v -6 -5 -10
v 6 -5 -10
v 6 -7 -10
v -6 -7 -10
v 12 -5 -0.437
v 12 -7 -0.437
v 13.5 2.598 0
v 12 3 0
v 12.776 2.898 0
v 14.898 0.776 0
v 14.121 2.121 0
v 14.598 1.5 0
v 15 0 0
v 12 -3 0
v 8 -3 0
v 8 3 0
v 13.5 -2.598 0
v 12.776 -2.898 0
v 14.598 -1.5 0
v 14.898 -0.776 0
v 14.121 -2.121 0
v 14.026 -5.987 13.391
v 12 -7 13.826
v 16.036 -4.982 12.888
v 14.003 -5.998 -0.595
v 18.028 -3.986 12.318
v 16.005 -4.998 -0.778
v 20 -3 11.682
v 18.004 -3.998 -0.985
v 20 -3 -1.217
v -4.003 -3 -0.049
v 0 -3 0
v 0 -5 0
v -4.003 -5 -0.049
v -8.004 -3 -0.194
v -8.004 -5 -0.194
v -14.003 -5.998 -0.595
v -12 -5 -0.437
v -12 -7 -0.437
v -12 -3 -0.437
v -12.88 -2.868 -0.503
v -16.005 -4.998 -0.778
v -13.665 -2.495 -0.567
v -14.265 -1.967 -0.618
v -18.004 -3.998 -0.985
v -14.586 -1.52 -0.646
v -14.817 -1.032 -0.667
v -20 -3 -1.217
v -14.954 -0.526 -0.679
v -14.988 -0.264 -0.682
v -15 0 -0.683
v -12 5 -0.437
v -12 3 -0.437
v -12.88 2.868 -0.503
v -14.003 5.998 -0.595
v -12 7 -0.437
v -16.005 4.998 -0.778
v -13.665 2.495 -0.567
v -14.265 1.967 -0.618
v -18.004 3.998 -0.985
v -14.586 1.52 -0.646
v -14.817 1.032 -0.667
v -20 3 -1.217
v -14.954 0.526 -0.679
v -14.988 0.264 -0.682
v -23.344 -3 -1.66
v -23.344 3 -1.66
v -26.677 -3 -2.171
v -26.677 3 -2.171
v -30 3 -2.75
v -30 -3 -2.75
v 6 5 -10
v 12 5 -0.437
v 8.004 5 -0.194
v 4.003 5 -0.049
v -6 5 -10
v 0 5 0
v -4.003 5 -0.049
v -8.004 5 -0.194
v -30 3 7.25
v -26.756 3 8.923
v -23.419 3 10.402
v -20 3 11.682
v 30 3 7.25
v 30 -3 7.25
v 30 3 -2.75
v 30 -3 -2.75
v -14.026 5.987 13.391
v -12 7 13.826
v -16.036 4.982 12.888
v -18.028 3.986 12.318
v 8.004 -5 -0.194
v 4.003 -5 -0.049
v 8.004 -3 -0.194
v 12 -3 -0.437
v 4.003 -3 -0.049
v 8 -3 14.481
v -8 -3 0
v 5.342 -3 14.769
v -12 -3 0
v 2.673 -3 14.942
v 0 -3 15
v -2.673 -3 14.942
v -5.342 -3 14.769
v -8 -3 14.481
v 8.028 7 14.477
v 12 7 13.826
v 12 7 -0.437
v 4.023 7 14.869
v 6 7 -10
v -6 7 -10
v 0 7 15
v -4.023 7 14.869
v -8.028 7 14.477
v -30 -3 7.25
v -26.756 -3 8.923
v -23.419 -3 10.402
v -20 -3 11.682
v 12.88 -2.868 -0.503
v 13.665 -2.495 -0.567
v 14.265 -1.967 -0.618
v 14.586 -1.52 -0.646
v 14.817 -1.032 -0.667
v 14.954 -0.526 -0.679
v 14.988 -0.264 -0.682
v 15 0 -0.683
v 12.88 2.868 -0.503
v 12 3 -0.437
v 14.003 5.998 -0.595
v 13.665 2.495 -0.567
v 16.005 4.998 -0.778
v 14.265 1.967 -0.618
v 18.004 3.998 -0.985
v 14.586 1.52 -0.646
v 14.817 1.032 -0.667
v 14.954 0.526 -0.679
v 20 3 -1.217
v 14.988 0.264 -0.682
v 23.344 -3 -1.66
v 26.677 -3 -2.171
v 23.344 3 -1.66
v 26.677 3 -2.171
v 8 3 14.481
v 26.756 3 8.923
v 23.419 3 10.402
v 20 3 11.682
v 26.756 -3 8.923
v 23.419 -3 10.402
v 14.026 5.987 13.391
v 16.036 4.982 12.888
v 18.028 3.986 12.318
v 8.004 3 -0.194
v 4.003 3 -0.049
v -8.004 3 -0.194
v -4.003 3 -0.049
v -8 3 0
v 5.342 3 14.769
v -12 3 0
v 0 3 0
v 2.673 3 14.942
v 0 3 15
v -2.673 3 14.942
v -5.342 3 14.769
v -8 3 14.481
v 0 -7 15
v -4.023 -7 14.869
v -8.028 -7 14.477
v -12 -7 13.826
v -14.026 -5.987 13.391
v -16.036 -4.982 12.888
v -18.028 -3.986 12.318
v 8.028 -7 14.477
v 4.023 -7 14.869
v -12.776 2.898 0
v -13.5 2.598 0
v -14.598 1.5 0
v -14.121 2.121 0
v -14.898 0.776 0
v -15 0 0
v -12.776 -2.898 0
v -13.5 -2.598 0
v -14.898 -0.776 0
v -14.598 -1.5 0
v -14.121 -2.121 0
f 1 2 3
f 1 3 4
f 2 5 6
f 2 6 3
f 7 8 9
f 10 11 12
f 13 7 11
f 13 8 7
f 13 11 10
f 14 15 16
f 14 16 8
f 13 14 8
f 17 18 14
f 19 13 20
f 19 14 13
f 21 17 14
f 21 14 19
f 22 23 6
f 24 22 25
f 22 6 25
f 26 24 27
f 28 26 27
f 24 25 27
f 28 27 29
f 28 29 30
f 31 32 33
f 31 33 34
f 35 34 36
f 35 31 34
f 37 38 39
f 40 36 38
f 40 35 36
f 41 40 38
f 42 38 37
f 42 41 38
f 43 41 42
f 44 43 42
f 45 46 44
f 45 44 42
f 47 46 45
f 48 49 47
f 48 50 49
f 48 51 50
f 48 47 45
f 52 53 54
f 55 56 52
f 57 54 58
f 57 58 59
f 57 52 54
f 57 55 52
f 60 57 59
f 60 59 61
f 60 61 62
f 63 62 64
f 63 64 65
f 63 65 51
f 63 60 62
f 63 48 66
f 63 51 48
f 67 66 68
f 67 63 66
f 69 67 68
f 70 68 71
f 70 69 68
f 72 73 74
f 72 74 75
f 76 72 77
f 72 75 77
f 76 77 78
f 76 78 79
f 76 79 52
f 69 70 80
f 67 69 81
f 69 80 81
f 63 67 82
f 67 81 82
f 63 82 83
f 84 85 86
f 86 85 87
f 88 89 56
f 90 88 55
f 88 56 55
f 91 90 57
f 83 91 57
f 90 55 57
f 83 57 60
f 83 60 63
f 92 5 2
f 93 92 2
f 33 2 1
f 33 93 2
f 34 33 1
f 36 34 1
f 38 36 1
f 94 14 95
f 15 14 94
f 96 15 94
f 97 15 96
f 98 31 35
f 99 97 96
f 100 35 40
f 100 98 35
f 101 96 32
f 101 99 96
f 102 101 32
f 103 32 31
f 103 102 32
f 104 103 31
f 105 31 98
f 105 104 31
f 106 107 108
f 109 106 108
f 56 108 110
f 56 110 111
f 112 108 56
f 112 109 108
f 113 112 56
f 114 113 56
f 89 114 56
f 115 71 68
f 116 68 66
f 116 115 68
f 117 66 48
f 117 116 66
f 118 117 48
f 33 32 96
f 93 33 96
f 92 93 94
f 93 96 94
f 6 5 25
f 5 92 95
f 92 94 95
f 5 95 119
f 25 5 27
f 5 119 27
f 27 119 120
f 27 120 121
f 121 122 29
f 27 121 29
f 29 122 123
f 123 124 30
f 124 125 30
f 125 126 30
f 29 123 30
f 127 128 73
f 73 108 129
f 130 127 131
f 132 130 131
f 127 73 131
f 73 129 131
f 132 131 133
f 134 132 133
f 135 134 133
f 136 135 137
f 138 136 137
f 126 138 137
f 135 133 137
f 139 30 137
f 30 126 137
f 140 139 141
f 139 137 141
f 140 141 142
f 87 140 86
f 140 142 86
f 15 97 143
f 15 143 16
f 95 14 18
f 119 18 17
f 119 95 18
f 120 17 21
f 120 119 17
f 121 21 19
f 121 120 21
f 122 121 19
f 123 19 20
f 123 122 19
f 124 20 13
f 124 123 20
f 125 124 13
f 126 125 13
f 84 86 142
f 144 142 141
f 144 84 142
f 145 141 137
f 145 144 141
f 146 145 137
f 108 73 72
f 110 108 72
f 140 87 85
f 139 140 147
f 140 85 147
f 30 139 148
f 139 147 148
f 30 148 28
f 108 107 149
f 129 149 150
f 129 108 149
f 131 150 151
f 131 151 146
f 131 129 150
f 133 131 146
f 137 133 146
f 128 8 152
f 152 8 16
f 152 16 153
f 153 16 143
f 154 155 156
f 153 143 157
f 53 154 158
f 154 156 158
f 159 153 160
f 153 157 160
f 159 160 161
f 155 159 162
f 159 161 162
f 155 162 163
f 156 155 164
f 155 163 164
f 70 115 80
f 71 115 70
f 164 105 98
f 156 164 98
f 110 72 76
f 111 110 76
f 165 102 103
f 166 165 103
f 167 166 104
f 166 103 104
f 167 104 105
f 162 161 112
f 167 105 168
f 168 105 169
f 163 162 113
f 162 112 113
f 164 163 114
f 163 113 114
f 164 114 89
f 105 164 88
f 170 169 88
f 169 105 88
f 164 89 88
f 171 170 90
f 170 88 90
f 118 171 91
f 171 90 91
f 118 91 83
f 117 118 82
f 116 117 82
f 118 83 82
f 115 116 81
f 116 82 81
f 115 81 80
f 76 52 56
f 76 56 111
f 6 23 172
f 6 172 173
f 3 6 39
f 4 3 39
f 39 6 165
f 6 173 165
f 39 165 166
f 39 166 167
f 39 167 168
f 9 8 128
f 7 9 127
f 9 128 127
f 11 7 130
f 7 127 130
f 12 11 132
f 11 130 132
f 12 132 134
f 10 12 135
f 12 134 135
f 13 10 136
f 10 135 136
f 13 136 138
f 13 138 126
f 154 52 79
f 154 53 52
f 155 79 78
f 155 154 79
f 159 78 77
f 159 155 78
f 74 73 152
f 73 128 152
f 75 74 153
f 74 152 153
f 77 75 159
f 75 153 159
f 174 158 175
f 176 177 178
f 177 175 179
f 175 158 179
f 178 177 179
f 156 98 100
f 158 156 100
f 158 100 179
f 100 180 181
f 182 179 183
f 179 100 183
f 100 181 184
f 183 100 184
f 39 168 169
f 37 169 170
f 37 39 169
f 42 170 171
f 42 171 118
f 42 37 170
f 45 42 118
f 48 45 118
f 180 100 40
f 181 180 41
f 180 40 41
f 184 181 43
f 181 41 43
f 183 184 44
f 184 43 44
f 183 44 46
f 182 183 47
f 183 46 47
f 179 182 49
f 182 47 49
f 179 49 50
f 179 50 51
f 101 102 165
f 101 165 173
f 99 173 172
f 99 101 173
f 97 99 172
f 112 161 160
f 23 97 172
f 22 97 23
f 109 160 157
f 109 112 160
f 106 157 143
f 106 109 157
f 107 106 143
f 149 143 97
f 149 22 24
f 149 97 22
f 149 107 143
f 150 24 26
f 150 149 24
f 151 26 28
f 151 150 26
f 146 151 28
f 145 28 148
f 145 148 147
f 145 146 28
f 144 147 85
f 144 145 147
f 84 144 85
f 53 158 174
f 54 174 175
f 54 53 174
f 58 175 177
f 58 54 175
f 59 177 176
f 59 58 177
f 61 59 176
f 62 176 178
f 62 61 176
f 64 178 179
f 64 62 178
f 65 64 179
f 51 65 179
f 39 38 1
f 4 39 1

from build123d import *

# Parameters (mm, degrees)
F2_DEPTH    = 3
F3_DEPTH    = 5
F4_START    = 5
F4_DEPTH    = 2
F5_T4_DEPTH = 55.7006365314
F5_S5_R     = 165
F5_T6_DEPTH = 30
F5_S7_R     = 61.9381694392
F5_T8_DEPTH = 30
F6_DEPTH    = 3
F7_R        = 2.99999


# Not quite as in the source:
# - a fillet or chamfer that OpenCascade refuses, or shapes differently, is made with other operations: its cross-section is extruded or revolved along the edge and cut away or added
# - a fillet or chamfer is up to 0.001 mm smaller than in the source, because OpenCascade refuses the exact size
# - a feature names something its author has since deleted; it is built from what else it names


with BuildPart() as f2:
    # F1 (on Front) → F2 (new body)
    with BuildSketch(Plane.XZ):
        with BuildLine():
            ThreePointArc((-30, -2.7501926041), (-21.0318278303, -1.3459068092), (-12, -0.4369421772))
            Line((-12, -0.4369421772), (-12, 13.8264323737))
            ThreePointArc((-12, 13.8264323737), (-21.2558932775, 11.2384911254), (-30, 7.2498073959))
            Line((-30, 7.2498073959), (-30, -2.7501926041))
        make_face()
        with BuildLine():
            ThreePointArc((-12, -0.4369421772), (-6.0039761506, -0.1092717271), (0, 0))
            Line((0, 0), (0, 15))
            ThreePointArc((0, 15), (-6.028624656, 14.7059099053), (-12, 13.8264323737))
            Line((-12, 13.8264323737), (-12, -0.4369421772))
        make_face()
    extrude(amount=F2_DEPTH)

    # F1 (on Front) → F3 (join)
    with BuildSketch(Plane.XZ):
        with BuildLine():
            ThreePointArc((-12, -0.4369421772), (-6.0039761506, -0.1092717271), (0, 0))
            Line((0, 0), (0, 15))
            ThreePointArc((0, 15), (-6.028624656, 14.7059099053), (-12, 13.8264323737))
            Line((-12, 13.8264323737), (-12, -0.4369421772))
        make_face()
    extrude(amount=F3_DEPTH)

    # F1 (on Front) → F4 (join)
    with BuildSketch(Plane.XZ.offset(F4_START)):
        with BuildLine():
            Line((0, -10), (0, 0))
            ThreePointArc((0, 0), (-6.0039761506, -0.1092717271), (-12, -0.4369421772))
            Line((-12, -0.4369421772), (-6, -10))
            Line((-6, -10), (0, -10))
        make_face()
        with BuildLine():
            ThreePointArc((-12, -0.4369421772), (-6.0039761506, -0.1092717271), (0, 0))
            Line((0, 0), (0, 15))
            ThreePointArc((0, 15), (-6.028624656, 14.7059099053), (-12, 13.8264323737))
            Line((-12, 13.8264323737), (-12, -0.4369421772))
        make_face()
    extrude(amount=F4_DEPTH)

    # F5: chamfer of 4 x 8 on 1 edges, made by hand


with BuildPart() as f5_tool2:
    # F5_s3 → F5_t4 (new body)
    with BuildSketch(Plane.XY.offset(-21.1555731675)):
        with BuildLine():
            Line((-11.7137832989, -7.1431083506), (-20.2862167011, -2.8568916494))
            Line((-20.2862167011, -2.8568916494), (-20.2862167011, -2.6968916494))
            ThreePointArc((-20.2862167011, -2.6968916494), (-16.1431083506, -2.84), (-12, -2.84))
            Line((-12, -2.84), (-11.84, -3))
            ThreePointArc((-11.84, -3), (-11.84, -5.0715541753), (-11.5537832989, -7.1431083506))
            Line((-11.5537832989, -7.1431083506), (-11.7137832989, -7.1431083506))
        make_face()
    extrude(amount=F5_T4_DEPTH)

    # F5_s5 → F5_t6 (cut, symmetric)
    with BuildSketch(Plane.XZ.offset(4.9)):
        with Locations((0, -165)):
            Circle(F5_S5_R)
    extrude(amount=F5_T6_DEPTH, both=True, mode=Mode.SUBTRACT)

    # F5_s7 → F5_t8 (intersect, symmetric)
    with BuildSketch(Plane.XZ.offset(4.9)):
        with Locations((0, -46.9381694392)):
            Circle(F5_S7_R)
    extrude(amount=F5_T8_DEPTH, both=True, mode=Mode.INTERSECT)

    split(bisect_by=Plane.XZ.offset(7), keep=Keep.BOTTOM)


with BuildPart() as f2_1:
    add(f2.part)

    # F5_t1: union F5_tool2
    add(f5_tool2.part)

    # F0 (on Front) → F6 (cut)
    with BuildSketch(Plane.XZ):
        Polygon((0, -20), (0, 0), (0, 110), (-6, 110), (-6, 100), (-8, 100), (-8, 0), (-15, 0), (-15, -20), align=None)
    extrude(amount=F6_DEPTH, mode=Mode.SUBTRACT)

    # F7 (radius 3 in the source; OpenCascade refuses exactly that, so slightly less here)
    f7_edges = [f2_1.edges().sort_by_distance(p)[0] for p in [
        (-15, -3, -0.341616),
    ]]
    fillet(f7_edges, radius=F7_R)

    # F8: F2 across plane


with BuildPart() as f2_2:
    add(f2_1.part)
    add(f2_1.part.mirror(Plane.XZ))

    # F9: F2 across plane


with BuildPart() as f2_3:
    add(f2_2.part)
    add(f2_2.part.mirror(Plane.YZ))


solid = f2_3.part
